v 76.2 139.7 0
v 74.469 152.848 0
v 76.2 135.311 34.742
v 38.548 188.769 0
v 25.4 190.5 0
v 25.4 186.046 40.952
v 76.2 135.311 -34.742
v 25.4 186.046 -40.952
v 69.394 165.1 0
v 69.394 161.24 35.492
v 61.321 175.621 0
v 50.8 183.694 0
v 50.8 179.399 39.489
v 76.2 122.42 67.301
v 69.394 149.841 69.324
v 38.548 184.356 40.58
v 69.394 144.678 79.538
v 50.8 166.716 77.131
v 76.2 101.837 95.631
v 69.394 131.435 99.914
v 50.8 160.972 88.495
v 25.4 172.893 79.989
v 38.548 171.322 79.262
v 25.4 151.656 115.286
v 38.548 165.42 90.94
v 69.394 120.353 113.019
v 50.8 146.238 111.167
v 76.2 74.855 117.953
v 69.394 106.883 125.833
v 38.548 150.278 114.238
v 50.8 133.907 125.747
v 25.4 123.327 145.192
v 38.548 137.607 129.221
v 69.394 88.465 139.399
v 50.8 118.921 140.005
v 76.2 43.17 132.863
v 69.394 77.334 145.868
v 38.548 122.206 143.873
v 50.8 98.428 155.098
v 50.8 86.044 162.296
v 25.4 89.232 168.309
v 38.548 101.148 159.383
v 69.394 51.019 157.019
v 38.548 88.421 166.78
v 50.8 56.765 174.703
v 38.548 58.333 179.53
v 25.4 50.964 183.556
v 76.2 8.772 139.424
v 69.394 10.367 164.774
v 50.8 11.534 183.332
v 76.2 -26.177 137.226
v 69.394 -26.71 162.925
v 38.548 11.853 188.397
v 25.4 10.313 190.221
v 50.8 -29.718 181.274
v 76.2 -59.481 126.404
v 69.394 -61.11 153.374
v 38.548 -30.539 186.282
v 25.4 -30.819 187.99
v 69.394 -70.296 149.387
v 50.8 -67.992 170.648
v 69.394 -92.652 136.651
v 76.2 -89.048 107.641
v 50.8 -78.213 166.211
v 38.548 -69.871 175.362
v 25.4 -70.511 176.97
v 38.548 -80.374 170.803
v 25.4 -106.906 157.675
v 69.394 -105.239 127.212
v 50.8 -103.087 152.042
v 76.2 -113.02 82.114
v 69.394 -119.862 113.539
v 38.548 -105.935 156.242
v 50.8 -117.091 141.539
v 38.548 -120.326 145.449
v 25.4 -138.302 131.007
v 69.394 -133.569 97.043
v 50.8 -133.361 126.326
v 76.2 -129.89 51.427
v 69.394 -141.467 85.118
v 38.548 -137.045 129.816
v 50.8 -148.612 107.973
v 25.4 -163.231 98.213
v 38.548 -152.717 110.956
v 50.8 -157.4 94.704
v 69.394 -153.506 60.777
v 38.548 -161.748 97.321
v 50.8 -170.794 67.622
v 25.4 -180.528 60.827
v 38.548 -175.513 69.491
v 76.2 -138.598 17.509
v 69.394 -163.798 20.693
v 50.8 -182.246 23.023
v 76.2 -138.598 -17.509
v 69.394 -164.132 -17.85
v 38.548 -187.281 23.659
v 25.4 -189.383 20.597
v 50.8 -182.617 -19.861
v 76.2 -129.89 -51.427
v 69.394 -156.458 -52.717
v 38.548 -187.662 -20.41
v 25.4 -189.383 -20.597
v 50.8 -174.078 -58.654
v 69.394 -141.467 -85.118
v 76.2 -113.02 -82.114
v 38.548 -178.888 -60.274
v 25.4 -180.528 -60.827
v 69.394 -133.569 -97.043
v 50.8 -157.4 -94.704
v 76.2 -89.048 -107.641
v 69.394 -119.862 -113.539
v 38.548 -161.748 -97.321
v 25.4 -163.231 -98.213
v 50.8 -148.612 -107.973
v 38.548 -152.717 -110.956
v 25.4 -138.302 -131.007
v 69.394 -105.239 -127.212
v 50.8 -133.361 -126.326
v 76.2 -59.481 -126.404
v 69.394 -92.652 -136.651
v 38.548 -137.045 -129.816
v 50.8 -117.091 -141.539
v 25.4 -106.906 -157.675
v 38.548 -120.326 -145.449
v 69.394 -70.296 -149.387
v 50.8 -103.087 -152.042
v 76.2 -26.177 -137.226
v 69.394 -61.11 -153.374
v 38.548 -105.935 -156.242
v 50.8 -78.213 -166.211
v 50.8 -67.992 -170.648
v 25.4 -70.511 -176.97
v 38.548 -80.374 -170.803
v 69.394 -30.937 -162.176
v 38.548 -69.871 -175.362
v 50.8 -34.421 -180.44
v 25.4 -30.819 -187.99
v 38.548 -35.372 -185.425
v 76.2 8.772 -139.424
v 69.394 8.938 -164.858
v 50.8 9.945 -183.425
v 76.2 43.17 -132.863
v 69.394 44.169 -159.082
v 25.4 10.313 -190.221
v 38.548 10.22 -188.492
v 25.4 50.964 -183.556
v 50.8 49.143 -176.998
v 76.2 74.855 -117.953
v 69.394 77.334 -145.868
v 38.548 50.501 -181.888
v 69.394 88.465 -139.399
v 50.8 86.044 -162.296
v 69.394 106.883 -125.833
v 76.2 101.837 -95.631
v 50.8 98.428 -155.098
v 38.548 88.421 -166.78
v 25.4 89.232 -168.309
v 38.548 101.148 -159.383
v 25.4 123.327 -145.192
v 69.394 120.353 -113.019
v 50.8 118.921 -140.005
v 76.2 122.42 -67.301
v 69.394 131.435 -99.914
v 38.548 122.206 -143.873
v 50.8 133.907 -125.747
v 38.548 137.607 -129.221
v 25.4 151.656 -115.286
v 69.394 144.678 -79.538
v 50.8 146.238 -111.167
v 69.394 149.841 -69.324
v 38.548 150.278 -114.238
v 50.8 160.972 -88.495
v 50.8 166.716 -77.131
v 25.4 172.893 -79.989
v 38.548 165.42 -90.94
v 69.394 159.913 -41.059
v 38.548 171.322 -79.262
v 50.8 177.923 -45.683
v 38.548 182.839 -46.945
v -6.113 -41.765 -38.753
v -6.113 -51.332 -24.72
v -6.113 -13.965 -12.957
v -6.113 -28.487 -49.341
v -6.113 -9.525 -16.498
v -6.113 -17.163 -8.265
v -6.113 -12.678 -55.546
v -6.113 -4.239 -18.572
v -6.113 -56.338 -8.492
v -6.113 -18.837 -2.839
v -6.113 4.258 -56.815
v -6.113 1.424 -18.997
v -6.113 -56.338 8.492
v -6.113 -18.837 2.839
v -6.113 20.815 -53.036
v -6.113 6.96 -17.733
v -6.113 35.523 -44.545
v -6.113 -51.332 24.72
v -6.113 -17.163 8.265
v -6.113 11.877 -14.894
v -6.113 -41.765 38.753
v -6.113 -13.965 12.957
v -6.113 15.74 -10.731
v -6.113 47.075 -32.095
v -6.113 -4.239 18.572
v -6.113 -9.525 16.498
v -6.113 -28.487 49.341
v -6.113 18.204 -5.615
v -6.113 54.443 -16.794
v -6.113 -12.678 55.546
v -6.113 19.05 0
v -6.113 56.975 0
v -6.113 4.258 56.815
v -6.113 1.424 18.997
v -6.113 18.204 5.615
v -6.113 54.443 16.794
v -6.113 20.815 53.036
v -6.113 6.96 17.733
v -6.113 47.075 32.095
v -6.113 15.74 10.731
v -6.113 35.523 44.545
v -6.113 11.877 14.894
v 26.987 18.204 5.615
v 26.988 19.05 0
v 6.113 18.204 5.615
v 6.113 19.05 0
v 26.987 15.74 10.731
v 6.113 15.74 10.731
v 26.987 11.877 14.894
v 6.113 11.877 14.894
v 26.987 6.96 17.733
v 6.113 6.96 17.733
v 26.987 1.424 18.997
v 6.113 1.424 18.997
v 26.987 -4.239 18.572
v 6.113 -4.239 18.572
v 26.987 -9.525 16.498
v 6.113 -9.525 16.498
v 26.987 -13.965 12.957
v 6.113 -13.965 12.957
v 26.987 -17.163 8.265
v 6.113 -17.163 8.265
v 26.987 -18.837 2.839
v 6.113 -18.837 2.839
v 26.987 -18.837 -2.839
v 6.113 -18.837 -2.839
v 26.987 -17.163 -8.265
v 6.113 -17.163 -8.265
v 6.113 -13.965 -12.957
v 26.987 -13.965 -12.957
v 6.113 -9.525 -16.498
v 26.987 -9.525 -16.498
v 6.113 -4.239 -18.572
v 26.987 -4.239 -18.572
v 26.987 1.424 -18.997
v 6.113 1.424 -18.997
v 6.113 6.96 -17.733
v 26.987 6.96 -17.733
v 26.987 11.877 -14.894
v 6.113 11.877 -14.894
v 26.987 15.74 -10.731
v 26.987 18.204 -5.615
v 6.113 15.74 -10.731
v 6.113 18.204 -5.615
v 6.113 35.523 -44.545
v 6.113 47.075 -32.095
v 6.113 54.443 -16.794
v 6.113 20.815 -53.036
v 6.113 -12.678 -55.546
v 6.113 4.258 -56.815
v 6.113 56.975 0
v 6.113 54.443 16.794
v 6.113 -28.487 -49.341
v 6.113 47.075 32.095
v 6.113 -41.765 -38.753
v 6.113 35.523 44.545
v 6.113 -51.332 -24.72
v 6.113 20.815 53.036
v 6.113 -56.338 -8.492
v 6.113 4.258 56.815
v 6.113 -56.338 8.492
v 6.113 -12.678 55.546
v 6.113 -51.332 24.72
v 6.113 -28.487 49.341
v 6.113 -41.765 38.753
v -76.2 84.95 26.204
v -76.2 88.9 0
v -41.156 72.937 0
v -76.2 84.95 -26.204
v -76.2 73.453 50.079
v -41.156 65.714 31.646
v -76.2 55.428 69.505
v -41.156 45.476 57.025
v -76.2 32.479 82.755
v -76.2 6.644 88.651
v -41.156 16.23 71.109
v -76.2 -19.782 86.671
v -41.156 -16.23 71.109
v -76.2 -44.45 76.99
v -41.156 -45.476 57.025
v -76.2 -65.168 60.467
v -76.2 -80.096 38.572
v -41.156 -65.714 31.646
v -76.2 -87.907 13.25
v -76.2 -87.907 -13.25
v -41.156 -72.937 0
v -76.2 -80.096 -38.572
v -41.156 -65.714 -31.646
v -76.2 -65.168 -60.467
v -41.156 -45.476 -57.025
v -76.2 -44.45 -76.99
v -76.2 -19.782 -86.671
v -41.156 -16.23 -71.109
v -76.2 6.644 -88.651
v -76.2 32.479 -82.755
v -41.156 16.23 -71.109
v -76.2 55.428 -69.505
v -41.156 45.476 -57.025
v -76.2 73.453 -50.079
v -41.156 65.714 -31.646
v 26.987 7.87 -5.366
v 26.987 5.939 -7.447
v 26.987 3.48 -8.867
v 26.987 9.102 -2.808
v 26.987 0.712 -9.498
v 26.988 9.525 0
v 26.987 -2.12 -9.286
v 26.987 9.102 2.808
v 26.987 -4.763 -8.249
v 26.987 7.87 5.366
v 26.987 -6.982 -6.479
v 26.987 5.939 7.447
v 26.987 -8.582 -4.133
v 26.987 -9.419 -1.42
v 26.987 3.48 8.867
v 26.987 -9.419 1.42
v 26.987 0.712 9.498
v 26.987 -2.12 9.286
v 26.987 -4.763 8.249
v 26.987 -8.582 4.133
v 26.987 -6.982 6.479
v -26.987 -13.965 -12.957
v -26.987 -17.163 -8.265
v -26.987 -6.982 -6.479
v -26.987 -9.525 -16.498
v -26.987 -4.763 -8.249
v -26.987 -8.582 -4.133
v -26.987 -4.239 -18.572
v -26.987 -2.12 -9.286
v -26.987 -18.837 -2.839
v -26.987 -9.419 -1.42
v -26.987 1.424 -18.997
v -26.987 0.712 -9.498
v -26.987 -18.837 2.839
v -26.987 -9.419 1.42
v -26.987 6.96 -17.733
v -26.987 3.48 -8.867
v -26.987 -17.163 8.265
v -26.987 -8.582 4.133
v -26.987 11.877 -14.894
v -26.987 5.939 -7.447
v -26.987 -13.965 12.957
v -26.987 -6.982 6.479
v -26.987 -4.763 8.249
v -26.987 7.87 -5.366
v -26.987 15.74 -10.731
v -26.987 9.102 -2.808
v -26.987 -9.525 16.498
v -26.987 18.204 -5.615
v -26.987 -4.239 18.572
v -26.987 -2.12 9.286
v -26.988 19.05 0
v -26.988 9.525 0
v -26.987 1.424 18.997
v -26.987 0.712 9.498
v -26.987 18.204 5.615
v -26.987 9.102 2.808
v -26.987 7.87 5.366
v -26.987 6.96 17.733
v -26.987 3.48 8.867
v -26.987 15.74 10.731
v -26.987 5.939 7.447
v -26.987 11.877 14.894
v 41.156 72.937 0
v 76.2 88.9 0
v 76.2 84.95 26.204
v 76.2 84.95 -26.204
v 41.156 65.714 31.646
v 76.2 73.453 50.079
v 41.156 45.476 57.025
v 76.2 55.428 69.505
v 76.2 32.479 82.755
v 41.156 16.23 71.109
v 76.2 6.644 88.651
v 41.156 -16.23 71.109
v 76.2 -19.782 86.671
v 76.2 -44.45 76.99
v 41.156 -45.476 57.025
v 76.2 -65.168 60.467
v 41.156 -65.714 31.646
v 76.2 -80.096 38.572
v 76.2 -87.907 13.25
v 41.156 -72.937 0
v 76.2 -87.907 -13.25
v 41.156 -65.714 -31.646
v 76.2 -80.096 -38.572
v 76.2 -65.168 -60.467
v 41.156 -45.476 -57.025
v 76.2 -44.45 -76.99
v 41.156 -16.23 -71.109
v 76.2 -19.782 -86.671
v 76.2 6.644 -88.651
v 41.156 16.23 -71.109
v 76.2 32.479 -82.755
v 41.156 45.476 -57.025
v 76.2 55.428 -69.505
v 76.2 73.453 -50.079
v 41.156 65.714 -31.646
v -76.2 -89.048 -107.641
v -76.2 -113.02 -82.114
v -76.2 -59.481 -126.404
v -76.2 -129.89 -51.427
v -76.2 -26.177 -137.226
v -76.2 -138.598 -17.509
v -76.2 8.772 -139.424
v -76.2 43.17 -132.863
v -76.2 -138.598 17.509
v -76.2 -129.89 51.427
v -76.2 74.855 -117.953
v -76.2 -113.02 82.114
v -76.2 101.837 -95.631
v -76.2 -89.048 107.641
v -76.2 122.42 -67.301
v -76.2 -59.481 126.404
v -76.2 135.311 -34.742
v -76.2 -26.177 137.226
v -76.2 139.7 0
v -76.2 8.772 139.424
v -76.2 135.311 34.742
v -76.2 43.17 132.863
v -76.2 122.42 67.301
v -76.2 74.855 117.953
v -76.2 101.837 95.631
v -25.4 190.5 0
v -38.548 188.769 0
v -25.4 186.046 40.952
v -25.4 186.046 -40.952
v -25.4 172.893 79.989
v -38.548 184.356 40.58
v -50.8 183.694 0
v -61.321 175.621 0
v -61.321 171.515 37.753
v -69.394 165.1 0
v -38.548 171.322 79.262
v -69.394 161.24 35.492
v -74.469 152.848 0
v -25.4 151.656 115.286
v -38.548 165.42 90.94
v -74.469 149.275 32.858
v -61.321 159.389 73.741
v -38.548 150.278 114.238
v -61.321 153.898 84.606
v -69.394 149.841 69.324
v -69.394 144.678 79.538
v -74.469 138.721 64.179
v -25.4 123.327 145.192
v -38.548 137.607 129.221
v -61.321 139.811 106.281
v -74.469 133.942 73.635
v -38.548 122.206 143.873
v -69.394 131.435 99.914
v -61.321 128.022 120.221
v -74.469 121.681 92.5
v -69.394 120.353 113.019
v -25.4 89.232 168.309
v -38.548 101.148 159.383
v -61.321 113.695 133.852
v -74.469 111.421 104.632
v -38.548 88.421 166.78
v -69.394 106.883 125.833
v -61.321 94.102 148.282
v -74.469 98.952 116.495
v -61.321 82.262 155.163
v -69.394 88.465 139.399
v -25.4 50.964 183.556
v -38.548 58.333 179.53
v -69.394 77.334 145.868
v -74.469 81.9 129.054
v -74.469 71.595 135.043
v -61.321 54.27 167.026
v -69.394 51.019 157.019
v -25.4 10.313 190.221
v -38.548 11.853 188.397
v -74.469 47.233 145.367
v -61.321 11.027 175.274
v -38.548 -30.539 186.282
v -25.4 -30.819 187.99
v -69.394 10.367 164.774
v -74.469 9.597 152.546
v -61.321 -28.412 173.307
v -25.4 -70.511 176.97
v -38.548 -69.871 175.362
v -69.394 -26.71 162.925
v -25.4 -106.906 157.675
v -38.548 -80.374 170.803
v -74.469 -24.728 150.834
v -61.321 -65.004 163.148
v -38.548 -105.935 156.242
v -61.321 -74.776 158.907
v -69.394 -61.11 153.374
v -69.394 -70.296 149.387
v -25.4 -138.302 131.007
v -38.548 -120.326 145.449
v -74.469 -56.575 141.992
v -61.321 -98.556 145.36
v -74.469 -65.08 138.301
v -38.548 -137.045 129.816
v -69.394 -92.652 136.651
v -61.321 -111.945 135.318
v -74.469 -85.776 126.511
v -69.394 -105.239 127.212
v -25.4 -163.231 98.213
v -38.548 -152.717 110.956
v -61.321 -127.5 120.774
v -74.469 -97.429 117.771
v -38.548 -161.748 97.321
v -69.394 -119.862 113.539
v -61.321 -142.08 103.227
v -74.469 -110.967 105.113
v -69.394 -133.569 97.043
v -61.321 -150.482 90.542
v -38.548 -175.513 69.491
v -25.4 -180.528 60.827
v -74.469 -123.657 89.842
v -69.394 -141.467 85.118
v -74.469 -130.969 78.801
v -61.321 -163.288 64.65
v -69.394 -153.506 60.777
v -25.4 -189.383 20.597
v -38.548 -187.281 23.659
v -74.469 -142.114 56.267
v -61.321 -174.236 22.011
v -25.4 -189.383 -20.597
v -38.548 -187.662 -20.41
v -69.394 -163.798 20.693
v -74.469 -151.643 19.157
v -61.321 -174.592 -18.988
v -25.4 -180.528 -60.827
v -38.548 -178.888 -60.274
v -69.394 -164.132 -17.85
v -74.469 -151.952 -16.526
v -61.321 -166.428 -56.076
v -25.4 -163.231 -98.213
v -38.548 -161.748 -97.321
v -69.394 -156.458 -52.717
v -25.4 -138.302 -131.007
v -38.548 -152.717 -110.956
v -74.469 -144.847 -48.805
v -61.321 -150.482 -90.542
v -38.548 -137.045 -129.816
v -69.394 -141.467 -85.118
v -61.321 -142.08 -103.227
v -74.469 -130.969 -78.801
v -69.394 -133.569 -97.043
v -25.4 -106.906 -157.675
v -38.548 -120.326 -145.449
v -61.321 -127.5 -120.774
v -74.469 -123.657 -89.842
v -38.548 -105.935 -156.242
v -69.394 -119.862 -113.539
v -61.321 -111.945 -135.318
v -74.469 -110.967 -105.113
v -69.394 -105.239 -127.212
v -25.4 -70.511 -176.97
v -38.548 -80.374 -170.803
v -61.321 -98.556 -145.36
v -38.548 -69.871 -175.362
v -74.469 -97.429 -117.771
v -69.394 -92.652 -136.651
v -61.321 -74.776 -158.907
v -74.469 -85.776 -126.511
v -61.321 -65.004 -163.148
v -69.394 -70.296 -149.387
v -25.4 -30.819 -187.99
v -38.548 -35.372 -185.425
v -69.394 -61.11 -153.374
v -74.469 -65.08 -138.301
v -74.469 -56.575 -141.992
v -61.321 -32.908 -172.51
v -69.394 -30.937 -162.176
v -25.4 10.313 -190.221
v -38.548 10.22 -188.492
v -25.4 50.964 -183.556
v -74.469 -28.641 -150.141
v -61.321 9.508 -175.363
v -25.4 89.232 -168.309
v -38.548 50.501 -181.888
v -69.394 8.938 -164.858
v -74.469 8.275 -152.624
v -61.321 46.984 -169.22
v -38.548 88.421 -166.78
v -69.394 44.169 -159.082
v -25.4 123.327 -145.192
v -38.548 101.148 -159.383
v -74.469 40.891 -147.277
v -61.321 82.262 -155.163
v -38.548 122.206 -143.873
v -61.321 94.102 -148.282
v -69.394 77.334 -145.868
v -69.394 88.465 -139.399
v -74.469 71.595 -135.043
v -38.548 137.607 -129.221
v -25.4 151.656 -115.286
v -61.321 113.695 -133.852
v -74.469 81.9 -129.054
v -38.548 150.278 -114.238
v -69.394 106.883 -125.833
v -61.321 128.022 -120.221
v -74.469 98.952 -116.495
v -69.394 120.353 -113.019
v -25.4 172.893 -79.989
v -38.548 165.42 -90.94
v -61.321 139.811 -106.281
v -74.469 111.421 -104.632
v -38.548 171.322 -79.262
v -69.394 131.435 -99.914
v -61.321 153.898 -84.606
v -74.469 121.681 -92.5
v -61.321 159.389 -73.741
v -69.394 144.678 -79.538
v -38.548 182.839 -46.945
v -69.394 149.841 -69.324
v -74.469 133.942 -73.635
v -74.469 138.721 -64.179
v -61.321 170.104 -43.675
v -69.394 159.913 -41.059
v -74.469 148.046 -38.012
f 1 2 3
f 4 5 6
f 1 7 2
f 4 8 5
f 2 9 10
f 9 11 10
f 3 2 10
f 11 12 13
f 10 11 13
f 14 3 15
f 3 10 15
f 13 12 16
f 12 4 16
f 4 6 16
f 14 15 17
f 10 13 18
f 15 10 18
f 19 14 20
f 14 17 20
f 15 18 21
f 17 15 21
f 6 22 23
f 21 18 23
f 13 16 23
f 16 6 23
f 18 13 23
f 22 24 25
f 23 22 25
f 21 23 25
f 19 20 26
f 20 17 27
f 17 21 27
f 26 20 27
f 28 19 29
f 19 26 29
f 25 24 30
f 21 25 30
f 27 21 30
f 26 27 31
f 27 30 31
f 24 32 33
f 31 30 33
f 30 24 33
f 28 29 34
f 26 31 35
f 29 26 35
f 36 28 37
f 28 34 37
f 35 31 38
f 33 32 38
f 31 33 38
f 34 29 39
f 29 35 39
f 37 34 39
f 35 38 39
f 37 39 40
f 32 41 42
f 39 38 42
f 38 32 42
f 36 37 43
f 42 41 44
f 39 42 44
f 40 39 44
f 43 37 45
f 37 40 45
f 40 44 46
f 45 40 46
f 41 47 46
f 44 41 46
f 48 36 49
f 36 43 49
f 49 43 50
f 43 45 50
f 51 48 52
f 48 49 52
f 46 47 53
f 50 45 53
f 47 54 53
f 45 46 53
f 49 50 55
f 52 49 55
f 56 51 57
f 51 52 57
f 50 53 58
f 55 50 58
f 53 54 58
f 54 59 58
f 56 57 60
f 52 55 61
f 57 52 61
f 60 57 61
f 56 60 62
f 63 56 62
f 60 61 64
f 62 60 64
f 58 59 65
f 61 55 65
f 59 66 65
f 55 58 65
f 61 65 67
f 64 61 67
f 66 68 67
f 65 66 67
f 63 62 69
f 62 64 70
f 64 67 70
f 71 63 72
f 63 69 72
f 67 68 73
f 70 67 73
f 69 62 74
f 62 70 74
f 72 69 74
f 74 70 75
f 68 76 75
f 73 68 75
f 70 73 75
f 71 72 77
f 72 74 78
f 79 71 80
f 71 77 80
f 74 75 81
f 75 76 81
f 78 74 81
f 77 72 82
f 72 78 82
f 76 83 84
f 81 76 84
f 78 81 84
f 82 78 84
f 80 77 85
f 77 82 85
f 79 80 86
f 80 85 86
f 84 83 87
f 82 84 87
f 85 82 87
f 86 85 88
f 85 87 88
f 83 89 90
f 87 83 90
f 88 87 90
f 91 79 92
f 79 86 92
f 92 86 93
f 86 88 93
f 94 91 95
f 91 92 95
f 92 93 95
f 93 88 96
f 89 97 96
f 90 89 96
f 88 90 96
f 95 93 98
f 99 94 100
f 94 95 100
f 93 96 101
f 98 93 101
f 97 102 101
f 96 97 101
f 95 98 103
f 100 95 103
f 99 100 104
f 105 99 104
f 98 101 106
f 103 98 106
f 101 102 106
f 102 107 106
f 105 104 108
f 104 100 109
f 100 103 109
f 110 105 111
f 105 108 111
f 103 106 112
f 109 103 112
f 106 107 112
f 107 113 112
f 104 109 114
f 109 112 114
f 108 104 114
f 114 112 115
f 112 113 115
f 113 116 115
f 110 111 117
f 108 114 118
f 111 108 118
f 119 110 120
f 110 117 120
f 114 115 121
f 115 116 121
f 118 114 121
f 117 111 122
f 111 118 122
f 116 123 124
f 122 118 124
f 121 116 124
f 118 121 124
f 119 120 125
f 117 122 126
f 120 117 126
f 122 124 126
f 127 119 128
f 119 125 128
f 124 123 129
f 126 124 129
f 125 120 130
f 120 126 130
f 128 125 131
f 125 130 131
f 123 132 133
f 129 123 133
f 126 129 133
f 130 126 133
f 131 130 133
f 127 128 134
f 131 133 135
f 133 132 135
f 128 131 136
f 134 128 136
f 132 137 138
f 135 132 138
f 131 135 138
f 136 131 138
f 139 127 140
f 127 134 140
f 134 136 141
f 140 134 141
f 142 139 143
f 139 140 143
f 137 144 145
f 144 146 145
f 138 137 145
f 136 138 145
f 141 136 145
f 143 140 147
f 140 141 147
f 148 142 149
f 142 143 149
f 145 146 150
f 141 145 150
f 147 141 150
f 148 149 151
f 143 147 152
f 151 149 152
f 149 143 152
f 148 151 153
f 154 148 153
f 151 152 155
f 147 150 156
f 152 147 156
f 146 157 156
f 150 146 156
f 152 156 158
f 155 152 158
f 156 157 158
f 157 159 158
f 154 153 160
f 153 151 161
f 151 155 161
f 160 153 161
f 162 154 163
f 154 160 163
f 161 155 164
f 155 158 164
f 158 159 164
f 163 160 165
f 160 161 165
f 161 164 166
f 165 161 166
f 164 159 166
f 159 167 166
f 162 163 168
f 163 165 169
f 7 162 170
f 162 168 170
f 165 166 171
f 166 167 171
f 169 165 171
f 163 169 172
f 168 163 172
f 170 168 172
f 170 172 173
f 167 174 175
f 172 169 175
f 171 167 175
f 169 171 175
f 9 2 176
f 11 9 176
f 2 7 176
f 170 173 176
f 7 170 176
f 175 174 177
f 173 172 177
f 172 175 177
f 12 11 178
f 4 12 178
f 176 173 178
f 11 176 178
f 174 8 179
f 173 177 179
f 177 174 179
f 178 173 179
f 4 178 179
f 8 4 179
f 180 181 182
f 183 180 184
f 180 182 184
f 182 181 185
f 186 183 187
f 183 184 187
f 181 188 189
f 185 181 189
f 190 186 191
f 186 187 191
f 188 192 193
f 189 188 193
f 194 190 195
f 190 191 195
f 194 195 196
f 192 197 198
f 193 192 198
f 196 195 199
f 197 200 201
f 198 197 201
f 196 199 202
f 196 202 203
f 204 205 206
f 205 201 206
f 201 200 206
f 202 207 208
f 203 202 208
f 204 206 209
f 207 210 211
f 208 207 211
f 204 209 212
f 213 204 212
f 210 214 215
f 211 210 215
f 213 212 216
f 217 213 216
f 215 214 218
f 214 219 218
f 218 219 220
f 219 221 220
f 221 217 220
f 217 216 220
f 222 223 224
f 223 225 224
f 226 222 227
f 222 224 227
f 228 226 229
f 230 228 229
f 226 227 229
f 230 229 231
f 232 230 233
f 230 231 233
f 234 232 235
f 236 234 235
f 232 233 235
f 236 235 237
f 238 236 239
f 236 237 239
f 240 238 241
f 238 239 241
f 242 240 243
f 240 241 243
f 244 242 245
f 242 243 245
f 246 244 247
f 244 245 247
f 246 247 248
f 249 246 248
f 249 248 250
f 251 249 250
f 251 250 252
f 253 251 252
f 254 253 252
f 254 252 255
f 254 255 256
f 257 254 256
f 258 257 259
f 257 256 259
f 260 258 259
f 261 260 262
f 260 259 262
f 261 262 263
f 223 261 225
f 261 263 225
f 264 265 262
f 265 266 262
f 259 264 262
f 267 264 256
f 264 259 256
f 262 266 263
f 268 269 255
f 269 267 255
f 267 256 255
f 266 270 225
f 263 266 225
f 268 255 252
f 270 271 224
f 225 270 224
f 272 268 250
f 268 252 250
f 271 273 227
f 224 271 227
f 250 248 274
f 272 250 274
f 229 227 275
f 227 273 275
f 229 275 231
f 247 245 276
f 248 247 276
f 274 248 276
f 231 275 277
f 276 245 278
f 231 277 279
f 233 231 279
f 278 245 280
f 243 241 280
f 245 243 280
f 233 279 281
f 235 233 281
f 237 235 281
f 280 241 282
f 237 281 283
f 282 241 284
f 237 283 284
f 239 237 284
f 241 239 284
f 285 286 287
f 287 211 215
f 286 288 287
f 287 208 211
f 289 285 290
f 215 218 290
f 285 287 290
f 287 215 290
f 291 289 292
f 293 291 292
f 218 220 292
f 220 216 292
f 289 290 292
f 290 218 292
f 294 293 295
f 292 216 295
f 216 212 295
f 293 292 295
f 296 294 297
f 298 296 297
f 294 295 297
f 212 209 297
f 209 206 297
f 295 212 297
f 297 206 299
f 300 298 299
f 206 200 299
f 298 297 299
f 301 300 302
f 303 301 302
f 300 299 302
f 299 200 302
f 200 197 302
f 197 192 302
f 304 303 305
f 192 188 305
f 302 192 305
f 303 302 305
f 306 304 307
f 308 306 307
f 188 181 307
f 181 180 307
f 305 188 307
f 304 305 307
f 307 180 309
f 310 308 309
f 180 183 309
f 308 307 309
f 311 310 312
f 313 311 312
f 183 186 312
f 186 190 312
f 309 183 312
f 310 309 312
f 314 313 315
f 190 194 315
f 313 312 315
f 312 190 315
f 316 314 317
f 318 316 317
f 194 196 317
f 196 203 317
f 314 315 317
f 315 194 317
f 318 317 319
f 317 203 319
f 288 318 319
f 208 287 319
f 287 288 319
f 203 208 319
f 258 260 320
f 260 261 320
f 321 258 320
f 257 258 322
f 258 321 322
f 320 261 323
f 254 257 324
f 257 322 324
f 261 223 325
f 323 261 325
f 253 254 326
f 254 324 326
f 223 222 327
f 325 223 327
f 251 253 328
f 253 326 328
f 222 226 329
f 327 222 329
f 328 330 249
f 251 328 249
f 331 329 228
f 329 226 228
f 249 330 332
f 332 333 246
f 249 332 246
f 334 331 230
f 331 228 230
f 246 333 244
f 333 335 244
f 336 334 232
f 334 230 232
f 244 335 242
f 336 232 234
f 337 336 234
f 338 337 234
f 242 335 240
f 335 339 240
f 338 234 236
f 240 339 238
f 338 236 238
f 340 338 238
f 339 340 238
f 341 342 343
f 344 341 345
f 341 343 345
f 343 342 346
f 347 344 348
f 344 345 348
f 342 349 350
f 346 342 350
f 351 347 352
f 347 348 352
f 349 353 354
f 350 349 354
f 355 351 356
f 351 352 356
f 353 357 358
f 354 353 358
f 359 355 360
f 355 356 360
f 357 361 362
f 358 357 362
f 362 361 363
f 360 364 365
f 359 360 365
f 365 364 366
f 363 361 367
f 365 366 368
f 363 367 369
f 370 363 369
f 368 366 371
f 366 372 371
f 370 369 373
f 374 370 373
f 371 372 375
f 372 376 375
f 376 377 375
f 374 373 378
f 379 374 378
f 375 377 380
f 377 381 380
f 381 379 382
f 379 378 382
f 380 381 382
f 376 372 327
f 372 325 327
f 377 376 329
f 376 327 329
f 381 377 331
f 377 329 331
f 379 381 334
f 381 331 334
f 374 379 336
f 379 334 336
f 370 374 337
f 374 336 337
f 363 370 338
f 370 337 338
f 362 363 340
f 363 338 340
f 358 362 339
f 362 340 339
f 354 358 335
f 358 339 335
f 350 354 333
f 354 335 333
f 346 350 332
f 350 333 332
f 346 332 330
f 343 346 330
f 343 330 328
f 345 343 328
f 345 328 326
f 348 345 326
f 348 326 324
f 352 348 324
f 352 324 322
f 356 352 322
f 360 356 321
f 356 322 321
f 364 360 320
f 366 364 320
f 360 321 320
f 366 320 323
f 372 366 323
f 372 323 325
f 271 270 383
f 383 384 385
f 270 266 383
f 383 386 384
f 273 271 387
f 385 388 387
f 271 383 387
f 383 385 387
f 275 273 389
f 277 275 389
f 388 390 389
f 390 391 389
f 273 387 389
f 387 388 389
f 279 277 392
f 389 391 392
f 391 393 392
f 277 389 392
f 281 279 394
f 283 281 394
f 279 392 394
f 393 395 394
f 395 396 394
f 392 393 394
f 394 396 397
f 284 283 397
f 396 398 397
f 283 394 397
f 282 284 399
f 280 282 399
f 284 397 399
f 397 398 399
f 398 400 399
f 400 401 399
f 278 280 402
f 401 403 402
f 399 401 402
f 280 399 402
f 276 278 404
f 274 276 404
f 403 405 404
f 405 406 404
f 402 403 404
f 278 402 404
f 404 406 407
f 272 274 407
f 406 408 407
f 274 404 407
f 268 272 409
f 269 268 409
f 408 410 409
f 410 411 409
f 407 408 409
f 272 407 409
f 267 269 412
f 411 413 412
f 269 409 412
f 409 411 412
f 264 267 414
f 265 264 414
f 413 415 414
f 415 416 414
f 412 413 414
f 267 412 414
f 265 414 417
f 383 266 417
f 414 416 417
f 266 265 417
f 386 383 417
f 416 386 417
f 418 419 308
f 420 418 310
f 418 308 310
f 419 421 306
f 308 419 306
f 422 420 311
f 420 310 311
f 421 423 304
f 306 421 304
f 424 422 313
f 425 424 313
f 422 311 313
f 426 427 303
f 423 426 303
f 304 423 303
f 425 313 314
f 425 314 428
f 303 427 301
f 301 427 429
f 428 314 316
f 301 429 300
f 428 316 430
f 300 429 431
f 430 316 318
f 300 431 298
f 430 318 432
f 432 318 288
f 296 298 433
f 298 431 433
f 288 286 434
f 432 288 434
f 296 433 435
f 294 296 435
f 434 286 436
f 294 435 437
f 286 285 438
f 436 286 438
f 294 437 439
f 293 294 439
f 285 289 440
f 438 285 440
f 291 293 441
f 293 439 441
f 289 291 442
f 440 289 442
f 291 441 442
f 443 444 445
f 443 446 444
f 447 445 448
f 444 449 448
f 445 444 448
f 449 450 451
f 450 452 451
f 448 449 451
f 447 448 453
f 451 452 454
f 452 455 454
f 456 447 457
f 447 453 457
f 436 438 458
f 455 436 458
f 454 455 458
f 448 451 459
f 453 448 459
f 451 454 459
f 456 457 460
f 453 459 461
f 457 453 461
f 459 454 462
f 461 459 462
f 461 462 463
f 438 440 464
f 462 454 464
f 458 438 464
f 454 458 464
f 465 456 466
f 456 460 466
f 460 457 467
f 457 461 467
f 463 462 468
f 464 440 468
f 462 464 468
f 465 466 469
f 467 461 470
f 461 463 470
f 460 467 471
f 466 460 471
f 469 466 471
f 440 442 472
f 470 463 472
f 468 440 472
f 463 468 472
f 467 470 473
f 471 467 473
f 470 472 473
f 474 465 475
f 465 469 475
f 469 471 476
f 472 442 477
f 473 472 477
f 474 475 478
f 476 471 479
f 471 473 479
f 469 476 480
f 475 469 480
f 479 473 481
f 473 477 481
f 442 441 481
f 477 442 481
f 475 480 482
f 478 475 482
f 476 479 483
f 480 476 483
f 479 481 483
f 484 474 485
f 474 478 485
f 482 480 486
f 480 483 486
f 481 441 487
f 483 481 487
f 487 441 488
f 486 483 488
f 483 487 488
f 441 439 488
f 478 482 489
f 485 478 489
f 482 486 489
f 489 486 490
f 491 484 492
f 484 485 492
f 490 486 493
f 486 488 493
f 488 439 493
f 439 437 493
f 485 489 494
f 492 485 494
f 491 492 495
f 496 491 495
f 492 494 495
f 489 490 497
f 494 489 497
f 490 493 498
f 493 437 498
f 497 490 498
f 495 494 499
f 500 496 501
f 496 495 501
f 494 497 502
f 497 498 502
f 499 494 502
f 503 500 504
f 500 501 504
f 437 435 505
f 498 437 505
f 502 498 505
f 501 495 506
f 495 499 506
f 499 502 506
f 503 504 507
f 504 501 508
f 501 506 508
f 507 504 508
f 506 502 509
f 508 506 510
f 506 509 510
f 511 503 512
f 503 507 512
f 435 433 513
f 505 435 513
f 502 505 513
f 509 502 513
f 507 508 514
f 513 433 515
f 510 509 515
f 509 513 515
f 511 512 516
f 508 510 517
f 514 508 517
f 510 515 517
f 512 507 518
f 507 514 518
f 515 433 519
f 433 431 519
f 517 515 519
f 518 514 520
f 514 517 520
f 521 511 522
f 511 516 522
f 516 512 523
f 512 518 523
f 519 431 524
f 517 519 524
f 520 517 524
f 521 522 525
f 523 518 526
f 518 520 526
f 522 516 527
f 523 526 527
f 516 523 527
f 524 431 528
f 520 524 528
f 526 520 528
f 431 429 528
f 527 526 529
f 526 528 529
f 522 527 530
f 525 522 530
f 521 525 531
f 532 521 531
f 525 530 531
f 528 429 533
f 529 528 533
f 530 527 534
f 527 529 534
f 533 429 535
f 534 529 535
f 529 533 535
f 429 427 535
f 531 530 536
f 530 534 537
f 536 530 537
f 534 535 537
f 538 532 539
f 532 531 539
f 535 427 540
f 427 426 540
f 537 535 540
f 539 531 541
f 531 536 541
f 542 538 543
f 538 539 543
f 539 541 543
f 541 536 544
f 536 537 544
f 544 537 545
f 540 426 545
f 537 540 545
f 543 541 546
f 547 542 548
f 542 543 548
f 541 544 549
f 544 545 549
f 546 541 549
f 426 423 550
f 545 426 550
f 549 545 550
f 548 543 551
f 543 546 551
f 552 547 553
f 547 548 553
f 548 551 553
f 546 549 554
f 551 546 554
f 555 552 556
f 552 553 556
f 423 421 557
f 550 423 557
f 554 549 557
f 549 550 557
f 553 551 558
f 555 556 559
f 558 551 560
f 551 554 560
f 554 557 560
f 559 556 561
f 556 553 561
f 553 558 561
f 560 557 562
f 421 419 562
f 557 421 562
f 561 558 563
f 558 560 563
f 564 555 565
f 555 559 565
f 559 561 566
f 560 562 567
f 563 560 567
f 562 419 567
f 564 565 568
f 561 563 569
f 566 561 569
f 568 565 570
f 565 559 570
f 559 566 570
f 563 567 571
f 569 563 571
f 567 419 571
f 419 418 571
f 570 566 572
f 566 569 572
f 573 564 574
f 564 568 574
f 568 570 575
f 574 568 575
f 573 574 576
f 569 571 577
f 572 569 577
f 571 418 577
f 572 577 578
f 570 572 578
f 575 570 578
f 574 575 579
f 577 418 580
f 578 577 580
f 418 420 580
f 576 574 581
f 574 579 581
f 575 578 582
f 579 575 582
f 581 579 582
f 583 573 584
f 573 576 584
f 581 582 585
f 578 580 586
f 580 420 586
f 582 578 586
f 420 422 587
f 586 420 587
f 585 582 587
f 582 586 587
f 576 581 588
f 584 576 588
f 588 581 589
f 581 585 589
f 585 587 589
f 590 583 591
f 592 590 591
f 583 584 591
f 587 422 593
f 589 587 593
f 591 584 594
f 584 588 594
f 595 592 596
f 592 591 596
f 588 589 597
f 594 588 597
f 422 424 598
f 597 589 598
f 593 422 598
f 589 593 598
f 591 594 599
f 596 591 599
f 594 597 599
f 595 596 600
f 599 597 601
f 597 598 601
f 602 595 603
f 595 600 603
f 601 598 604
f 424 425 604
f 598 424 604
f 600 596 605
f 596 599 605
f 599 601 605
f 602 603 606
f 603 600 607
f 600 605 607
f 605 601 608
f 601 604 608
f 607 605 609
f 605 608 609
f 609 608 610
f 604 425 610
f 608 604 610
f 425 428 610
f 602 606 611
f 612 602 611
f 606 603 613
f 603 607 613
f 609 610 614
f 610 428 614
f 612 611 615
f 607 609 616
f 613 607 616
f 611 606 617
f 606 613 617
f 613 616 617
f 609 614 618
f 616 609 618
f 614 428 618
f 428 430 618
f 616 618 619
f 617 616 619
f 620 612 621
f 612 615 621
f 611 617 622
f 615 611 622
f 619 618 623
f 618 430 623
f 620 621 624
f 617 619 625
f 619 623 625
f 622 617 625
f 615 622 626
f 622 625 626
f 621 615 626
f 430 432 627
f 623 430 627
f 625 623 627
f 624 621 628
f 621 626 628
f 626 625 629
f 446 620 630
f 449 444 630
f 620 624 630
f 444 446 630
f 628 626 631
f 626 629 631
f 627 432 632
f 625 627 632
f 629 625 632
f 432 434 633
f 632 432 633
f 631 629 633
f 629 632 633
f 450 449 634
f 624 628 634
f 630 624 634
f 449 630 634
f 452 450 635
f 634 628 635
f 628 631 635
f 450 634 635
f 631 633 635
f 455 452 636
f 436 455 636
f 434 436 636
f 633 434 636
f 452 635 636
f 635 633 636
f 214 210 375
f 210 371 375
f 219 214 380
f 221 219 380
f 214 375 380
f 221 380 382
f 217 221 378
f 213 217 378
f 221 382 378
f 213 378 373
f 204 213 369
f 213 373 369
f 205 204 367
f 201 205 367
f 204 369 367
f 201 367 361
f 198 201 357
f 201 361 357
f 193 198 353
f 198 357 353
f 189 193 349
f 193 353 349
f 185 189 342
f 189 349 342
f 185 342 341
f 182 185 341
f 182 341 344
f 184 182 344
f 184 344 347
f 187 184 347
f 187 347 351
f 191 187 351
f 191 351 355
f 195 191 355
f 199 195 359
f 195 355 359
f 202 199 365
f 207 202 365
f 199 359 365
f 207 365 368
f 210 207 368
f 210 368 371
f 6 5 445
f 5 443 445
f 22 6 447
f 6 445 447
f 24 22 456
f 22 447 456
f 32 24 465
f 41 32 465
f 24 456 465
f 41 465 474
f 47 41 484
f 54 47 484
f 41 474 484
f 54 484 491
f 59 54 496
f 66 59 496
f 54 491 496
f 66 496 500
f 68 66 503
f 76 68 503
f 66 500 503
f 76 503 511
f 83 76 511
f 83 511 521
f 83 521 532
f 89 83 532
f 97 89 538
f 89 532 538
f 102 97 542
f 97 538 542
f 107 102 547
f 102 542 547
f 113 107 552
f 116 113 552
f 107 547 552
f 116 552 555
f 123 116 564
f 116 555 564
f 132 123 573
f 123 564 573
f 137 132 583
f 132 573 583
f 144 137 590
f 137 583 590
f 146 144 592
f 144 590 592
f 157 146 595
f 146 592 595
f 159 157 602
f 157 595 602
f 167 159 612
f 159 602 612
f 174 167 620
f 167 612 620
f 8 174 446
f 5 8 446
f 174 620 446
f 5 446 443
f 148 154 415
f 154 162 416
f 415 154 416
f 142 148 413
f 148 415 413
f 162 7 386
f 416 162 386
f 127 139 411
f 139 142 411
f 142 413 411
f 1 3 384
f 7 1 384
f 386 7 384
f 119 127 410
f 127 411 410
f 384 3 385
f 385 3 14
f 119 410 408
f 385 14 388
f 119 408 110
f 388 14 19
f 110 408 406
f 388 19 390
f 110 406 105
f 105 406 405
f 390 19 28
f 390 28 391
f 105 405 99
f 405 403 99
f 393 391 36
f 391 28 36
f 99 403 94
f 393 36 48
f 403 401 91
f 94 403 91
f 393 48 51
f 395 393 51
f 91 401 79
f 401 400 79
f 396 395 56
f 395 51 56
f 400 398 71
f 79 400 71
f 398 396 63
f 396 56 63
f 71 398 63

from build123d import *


with BuildPart() as part:
    # Sketch1 → Revolve1 (revolve)
    with BuildSketch(Plane.XY):
        with BuildLine():
            Line((-26.9875, 9.525), (26.9875, 9.525))
            Line((26.9875, 9.525), (26.9875, 19.05))
            Line((26.9875, 19.05), (6.112639692, 19.05))
            Line((6.112639692, 19.05), (6.112639692, 56.974587415))
            Line((6.112639692, 56.974587415), (76.2, 88.9))
            Line((76.2, 88.9), (76.2, 139.7))
            ThreePointArc((76.2, 139.7), (61.321024484, 175.621024484), (25.4, 190.5))
            Line((25.4, 190.5), (-25.4, 190.5))
            ThreePointArc((-25.4, 190.5), (-61.321024484, 175.621024484), (-76.2, 139.7))
            Line((-76.2, 139.7), (-76.2, 88.9))
            Line((-76.2, 88.9), (-6.112639692, 56.974587415))
            Line((-6.112639692, 56.974587415), (-6.112639692, 19.05))
            Line((-6.112639692, 19.05), (-26.9875, 19.05))
            Line((-26.9875, 19.05), (-26.9875, 9.525))
        make_face()
    revolve(axis=Axis((-76.2, 0, 0), (1, 0, 0)))


solid = part.part
